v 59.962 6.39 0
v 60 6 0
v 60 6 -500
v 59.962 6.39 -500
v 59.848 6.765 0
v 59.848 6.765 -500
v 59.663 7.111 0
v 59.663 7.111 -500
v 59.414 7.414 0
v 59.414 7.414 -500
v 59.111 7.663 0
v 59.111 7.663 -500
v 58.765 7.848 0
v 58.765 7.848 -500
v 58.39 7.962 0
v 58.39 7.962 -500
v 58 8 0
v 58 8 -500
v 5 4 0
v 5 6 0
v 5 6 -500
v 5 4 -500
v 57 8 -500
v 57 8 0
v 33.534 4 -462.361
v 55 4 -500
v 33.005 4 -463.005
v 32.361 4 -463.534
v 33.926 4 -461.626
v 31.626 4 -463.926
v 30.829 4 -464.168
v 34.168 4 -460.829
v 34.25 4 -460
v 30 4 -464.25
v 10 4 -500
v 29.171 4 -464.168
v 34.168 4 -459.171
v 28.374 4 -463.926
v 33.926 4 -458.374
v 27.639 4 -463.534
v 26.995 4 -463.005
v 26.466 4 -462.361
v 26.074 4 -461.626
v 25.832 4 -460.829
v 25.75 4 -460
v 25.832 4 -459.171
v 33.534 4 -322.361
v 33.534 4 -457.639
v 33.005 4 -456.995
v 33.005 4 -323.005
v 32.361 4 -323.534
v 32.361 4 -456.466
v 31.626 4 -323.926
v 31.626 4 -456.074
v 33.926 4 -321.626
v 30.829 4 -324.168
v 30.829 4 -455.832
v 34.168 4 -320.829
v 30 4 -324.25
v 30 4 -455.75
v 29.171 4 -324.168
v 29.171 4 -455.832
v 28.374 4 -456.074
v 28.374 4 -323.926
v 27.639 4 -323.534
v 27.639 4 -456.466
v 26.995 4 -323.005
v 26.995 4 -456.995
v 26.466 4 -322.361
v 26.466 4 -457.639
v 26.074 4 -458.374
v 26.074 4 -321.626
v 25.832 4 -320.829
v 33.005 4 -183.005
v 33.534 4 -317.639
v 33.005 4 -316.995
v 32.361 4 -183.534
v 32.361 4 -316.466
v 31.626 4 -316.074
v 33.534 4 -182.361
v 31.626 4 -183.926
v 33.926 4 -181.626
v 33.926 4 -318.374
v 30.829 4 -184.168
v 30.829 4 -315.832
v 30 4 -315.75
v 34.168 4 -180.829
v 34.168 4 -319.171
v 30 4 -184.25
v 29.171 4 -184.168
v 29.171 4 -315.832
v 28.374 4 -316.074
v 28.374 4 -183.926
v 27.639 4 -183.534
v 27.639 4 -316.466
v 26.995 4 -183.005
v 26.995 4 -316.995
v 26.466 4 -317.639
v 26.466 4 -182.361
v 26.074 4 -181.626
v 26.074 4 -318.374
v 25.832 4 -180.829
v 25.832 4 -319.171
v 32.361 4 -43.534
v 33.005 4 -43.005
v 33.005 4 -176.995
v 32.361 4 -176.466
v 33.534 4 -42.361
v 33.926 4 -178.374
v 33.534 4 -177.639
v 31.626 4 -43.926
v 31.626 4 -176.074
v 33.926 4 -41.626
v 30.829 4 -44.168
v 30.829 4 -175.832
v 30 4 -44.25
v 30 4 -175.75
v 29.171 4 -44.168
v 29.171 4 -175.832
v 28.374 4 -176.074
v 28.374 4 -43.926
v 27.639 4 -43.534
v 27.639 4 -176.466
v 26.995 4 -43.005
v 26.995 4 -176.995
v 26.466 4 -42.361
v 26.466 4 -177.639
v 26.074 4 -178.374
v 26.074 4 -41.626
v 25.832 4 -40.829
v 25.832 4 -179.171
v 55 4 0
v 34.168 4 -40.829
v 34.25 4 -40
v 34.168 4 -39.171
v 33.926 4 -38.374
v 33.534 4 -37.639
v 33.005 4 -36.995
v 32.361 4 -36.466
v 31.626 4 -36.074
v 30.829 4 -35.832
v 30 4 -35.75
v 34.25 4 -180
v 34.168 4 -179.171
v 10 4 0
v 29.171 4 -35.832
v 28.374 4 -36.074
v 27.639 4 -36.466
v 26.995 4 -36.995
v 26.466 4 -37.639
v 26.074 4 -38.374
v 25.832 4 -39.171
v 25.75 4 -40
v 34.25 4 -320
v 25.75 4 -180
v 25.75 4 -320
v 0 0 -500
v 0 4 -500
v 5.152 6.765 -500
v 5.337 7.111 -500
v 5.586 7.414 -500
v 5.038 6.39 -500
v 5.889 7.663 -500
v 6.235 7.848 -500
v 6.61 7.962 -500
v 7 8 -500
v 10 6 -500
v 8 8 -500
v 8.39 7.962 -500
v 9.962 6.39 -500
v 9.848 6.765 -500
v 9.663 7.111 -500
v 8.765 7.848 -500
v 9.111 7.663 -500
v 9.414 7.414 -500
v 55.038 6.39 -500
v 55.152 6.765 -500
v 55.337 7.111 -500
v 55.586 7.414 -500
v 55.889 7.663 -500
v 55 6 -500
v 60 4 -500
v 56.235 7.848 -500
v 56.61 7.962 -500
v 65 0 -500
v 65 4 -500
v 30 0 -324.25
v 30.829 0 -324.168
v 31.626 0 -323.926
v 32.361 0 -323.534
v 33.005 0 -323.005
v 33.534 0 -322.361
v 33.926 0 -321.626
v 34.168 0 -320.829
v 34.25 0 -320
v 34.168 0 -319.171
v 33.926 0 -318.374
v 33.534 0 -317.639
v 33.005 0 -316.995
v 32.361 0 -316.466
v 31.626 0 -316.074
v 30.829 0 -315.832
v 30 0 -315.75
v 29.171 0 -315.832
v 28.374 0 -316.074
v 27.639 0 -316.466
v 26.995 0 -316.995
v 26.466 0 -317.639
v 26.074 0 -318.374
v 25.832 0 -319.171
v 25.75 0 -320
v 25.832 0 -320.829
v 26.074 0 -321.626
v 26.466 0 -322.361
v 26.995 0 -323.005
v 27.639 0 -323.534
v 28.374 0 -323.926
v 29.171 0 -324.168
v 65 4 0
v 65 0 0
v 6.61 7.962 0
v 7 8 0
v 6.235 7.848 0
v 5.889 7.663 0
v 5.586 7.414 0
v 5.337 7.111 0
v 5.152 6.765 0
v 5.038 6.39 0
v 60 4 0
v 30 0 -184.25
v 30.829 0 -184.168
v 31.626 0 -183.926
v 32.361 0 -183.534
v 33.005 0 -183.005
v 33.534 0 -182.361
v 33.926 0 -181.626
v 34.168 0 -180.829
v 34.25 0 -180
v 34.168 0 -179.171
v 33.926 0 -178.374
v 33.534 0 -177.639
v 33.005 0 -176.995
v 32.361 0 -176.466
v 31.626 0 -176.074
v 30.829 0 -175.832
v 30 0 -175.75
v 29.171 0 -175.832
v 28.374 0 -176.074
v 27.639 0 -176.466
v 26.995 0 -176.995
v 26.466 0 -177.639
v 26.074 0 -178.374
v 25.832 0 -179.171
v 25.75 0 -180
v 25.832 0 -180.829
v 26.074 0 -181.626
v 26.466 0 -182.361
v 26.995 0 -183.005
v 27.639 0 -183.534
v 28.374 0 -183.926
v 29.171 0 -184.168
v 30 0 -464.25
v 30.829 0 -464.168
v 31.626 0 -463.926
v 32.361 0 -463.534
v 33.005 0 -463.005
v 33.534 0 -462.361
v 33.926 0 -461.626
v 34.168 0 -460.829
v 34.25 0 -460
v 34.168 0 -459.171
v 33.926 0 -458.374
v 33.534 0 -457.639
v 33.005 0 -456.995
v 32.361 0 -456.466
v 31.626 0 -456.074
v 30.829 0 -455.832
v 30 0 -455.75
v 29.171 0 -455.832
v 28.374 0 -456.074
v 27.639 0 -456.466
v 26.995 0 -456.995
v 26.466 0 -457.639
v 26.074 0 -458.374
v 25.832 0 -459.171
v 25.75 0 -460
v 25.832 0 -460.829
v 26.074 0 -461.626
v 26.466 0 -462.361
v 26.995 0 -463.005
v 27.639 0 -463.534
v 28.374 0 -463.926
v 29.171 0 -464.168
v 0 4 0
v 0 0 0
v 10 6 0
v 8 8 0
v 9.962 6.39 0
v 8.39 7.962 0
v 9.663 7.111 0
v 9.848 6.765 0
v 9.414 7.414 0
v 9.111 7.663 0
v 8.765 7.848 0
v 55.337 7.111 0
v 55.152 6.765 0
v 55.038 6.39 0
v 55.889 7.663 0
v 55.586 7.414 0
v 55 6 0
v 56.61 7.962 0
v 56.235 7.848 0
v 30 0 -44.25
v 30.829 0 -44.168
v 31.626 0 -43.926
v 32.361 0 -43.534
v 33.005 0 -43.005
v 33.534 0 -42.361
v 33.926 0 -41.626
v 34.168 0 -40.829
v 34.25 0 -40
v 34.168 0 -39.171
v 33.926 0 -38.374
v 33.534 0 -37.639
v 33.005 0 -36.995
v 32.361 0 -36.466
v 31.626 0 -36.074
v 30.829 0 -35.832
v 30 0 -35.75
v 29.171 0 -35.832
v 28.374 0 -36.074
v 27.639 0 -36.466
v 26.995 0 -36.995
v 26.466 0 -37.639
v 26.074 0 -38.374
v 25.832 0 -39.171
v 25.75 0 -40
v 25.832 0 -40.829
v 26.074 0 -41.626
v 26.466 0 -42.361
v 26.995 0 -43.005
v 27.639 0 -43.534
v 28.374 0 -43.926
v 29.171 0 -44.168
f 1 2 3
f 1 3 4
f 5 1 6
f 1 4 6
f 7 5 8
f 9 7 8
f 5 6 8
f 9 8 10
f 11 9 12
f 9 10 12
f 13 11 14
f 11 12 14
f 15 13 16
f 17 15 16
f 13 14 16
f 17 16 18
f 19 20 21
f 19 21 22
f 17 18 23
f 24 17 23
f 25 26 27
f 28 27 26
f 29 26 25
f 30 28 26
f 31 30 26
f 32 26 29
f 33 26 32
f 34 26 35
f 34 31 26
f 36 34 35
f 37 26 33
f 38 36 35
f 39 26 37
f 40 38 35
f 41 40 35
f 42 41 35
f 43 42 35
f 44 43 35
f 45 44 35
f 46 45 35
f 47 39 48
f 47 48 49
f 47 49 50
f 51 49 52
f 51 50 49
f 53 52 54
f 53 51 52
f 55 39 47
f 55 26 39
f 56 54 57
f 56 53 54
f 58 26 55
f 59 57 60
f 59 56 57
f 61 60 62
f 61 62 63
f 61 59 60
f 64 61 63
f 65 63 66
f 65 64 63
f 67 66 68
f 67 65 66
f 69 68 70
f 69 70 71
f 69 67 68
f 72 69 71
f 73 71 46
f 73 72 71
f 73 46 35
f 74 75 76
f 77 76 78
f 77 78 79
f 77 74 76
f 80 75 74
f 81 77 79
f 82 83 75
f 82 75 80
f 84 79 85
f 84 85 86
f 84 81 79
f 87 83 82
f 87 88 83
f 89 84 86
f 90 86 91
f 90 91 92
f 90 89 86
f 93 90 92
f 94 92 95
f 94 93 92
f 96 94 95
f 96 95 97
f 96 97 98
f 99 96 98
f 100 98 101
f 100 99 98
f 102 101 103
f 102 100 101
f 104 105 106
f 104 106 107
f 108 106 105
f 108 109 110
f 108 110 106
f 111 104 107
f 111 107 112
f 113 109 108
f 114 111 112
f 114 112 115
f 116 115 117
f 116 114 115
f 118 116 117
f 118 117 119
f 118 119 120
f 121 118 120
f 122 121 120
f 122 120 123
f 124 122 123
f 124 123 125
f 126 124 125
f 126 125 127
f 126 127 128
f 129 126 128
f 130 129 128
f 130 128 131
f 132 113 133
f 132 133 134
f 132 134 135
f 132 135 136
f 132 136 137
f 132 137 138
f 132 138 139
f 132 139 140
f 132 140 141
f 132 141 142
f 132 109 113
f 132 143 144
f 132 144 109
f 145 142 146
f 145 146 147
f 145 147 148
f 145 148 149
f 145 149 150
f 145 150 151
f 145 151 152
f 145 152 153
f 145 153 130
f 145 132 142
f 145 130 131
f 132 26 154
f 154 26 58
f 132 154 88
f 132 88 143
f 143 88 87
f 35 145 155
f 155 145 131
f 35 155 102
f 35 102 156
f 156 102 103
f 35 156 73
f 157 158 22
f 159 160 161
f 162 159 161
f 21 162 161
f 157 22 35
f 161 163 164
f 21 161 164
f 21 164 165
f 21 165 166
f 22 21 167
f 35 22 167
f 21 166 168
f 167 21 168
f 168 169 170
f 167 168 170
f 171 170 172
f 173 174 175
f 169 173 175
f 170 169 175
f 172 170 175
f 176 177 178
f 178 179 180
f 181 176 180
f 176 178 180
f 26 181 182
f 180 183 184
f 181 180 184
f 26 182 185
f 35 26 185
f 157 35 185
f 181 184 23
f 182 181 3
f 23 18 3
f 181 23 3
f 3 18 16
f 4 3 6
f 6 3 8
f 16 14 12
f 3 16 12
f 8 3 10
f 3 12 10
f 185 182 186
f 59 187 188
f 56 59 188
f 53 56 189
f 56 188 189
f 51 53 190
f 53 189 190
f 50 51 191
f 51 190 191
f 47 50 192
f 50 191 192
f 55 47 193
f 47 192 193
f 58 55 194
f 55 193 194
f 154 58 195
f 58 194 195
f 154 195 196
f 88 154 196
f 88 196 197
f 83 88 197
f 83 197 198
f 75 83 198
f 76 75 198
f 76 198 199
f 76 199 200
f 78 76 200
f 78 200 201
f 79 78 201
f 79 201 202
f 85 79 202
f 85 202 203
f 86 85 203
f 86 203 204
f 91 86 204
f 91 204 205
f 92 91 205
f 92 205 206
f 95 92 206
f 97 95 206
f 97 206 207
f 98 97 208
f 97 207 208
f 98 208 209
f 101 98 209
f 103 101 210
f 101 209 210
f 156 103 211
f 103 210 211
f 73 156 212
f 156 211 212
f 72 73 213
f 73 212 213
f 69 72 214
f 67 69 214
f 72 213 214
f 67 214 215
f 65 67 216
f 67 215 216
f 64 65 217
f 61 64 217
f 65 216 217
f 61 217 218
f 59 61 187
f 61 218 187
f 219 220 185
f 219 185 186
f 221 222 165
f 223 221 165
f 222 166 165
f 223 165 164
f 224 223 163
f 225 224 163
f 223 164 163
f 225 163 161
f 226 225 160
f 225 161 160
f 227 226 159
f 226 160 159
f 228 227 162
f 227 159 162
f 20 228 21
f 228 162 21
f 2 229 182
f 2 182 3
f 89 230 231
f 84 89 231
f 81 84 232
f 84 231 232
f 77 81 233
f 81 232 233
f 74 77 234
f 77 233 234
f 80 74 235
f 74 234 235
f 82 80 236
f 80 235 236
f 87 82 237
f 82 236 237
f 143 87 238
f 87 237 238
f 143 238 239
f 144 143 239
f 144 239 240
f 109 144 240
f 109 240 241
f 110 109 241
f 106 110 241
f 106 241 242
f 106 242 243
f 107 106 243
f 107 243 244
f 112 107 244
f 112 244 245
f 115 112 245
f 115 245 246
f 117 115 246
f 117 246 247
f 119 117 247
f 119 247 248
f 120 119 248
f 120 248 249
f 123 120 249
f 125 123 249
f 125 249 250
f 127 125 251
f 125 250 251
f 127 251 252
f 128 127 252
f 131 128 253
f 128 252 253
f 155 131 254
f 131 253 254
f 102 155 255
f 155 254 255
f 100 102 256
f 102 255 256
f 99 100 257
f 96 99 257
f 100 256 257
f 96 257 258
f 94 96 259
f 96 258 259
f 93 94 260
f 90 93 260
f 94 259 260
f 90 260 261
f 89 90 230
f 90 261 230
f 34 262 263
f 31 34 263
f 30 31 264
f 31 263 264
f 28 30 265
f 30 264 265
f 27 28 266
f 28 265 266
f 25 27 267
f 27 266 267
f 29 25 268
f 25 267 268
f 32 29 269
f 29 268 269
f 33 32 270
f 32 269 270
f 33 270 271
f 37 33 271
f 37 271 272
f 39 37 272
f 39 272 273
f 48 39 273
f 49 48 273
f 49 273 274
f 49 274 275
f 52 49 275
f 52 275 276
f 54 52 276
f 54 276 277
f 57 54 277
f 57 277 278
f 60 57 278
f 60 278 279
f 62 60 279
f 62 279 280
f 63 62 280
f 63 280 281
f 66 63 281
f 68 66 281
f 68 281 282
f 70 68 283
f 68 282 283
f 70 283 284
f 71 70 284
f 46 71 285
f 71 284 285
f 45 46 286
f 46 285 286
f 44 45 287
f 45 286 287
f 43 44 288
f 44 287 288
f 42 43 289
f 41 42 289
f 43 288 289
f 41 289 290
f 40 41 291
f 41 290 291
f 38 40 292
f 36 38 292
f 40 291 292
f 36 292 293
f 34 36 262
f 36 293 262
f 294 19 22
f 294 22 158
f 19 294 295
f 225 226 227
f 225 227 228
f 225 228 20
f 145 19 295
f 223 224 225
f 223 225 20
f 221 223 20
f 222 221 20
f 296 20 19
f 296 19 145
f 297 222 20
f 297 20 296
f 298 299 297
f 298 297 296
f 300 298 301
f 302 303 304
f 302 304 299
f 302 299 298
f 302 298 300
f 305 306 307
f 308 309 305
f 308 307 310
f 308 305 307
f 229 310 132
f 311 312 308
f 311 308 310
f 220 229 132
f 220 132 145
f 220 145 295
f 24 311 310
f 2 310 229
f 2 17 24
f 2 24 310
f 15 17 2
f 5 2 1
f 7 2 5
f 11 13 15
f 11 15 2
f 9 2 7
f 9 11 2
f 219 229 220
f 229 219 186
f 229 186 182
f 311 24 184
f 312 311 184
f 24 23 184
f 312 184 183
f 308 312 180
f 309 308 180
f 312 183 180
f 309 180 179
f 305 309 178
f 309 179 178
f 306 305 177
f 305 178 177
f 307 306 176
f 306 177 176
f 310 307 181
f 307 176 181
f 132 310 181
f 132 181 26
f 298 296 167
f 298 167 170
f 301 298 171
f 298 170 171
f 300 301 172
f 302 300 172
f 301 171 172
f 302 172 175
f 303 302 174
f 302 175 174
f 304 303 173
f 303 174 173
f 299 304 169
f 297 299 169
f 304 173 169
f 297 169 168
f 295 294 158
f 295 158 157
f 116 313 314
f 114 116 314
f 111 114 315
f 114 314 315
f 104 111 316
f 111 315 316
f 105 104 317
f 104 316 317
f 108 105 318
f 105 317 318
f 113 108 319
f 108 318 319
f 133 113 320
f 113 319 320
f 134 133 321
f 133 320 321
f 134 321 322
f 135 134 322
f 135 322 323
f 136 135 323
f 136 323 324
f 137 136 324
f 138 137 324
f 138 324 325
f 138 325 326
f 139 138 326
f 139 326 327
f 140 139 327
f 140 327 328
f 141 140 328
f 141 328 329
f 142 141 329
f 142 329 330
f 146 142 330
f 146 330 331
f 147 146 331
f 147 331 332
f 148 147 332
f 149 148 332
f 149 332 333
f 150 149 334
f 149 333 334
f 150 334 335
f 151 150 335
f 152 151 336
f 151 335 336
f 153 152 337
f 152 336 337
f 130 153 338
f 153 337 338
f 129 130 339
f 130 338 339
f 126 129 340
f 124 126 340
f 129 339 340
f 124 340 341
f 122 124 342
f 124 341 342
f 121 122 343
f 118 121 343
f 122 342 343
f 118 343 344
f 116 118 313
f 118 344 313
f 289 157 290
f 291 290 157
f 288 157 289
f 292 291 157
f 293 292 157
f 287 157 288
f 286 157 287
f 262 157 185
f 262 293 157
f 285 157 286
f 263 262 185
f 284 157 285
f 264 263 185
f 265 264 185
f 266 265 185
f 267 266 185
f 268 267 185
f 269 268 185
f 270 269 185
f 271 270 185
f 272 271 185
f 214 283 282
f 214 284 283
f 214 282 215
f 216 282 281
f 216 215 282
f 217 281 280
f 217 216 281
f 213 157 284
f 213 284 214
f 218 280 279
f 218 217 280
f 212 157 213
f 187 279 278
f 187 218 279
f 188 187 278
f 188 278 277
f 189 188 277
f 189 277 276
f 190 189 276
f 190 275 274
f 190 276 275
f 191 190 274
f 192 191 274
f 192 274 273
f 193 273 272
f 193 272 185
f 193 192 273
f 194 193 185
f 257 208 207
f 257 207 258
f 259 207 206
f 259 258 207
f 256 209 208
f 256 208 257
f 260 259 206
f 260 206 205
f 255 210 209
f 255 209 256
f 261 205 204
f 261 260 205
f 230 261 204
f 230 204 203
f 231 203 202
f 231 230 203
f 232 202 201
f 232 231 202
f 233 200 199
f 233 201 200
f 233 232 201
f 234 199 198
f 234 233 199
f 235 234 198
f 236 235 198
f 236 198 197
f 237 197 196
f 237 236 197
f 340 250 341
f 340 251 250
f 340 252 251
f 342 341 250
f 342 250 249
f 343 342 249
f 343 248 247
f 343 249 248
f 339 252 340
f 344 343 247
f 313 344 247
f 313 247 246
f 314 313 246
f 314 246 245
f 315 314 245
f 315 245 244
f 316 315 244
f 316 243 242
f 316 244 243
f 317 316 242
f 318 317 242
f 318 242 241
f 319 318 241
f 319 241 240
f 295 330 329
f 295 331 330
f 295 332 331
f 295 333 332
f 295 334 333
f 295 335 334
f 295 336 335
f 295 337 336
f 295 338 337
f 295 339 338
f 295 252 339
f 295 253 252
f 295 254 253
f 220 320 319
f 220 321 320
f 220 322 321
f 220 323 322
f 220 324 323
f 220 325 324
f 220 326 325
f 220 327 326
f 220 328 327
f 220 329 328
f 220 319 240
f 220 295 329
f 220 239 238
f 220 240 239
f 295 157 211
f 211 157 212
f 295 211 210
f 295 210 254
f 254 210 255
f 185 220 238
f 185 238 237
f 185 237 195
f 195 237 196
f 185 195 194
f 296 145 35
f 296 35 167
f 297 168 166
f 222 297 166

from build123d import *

# Parameters (mm, degrees)
Y_KSEKLIK_EKSTR_ZYON1_DEPTH = 500
RADYUS1_R                   = 2
IZIM2_R                     = 4.25
KES_EKSTR_ZYON1_DEPTH       = 10


with BuildPart() as part:
    # Çizim1 → Yükseklik-Ekstrüzyon1 (new body)
    with BuildSketch(Plane.XY):
        Polygon((0, 0), (65, 0), (65, 4), (60, 4), (60, 8), (55, 8), (55, 4), (10, 4), (10, 8), (5, 8), (5, 4), (0, 4), align=None)
    extrude(amount=-Y_KSEKLIK_EKSTR_ZYON1_DEPTH)

    # Radyus1
    radyus1_edges = [part.edges().sort_by_distance(p)[0] for p in [
        (5, 8, -250),
        (10, 8, -250),
        (55, 8, -250),
        (60, 8, -250),
    ]]
    fillet(radyus1_edges, radius=RADYUS1_R)

    # Çizim2 → Kes-Ekstrüzyon1 (cut)
    with BuildSketch(Plane.XZ):
        with Locations(Location((30, -40, 0), (0, 0, 270))):
            Circle(IZIM2_R)
        with Locations(Location((30, -180, 0), (0, 0, 270))):
            Circle(IZIM2_R)
        with Locations(Location((30, -320, 0), (0, 0, 270))):
            Circle(IZIM2_R)
        with Locations(Location((30, -460, 0), (0, 0, 270))):
            Circle(IZIM2_R)
    extrude(amount=-KES_EKSTR_ZYON1_DEPTH, mode=Mode.SUBTRACT)


solid = part.part
